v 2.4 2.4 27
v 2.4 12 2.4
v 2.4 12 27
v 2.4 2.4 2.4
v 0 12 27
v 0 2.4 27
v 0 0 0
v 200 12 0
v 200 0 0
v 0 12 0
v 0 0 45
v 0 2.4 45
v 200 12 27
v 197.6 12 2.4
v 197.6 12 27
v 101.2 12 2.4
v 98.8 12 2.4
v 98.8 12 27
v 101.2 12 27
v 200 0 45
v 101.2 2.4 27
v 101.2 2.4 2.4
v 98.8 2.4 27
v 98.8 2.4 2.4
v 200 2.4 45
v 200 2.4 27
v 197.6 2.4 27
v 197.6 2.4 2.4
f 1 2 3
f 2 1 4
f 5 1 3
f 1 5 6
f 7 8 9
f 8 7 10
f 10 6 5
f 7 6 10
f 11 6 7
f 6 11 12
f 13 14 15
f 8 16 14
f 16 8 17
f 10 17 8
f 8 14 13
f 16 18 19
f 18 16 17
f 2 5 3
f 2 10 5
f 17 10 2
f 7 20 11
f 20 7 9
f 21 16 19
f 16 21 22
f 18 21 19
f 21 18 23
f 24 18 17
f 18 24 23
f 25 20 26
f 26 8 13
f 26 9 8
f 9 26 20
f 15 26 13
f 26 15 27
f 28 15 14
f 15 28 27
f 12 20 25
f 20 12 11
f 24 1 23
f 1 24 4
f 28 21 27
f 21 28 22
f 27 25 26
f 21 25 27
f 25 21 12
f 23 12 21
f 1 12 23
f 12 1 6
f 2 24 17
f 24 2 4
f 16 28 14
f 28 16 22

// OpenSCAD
// Privacy wall: a low wall along the bed's front edge in front of the AI's face-up hand zone, so the person
// can't read the AI's hand. Feet take the double-sided mounting tape. Units: mm.
len    = 200;          // the hand zone's width
height = 45;           // above a lying card, below the camera's view of the zone
t      = 2.4;
foot   = 12;
union() {
    cube([len, t, height]);
    cube([len, foot, t]);                // tape foot
    for (x = [0, len / 2 - t / 2, len - t]) translate([x, 0, 0]) cube([t, foot, height * 0.6]);   // braces
}
